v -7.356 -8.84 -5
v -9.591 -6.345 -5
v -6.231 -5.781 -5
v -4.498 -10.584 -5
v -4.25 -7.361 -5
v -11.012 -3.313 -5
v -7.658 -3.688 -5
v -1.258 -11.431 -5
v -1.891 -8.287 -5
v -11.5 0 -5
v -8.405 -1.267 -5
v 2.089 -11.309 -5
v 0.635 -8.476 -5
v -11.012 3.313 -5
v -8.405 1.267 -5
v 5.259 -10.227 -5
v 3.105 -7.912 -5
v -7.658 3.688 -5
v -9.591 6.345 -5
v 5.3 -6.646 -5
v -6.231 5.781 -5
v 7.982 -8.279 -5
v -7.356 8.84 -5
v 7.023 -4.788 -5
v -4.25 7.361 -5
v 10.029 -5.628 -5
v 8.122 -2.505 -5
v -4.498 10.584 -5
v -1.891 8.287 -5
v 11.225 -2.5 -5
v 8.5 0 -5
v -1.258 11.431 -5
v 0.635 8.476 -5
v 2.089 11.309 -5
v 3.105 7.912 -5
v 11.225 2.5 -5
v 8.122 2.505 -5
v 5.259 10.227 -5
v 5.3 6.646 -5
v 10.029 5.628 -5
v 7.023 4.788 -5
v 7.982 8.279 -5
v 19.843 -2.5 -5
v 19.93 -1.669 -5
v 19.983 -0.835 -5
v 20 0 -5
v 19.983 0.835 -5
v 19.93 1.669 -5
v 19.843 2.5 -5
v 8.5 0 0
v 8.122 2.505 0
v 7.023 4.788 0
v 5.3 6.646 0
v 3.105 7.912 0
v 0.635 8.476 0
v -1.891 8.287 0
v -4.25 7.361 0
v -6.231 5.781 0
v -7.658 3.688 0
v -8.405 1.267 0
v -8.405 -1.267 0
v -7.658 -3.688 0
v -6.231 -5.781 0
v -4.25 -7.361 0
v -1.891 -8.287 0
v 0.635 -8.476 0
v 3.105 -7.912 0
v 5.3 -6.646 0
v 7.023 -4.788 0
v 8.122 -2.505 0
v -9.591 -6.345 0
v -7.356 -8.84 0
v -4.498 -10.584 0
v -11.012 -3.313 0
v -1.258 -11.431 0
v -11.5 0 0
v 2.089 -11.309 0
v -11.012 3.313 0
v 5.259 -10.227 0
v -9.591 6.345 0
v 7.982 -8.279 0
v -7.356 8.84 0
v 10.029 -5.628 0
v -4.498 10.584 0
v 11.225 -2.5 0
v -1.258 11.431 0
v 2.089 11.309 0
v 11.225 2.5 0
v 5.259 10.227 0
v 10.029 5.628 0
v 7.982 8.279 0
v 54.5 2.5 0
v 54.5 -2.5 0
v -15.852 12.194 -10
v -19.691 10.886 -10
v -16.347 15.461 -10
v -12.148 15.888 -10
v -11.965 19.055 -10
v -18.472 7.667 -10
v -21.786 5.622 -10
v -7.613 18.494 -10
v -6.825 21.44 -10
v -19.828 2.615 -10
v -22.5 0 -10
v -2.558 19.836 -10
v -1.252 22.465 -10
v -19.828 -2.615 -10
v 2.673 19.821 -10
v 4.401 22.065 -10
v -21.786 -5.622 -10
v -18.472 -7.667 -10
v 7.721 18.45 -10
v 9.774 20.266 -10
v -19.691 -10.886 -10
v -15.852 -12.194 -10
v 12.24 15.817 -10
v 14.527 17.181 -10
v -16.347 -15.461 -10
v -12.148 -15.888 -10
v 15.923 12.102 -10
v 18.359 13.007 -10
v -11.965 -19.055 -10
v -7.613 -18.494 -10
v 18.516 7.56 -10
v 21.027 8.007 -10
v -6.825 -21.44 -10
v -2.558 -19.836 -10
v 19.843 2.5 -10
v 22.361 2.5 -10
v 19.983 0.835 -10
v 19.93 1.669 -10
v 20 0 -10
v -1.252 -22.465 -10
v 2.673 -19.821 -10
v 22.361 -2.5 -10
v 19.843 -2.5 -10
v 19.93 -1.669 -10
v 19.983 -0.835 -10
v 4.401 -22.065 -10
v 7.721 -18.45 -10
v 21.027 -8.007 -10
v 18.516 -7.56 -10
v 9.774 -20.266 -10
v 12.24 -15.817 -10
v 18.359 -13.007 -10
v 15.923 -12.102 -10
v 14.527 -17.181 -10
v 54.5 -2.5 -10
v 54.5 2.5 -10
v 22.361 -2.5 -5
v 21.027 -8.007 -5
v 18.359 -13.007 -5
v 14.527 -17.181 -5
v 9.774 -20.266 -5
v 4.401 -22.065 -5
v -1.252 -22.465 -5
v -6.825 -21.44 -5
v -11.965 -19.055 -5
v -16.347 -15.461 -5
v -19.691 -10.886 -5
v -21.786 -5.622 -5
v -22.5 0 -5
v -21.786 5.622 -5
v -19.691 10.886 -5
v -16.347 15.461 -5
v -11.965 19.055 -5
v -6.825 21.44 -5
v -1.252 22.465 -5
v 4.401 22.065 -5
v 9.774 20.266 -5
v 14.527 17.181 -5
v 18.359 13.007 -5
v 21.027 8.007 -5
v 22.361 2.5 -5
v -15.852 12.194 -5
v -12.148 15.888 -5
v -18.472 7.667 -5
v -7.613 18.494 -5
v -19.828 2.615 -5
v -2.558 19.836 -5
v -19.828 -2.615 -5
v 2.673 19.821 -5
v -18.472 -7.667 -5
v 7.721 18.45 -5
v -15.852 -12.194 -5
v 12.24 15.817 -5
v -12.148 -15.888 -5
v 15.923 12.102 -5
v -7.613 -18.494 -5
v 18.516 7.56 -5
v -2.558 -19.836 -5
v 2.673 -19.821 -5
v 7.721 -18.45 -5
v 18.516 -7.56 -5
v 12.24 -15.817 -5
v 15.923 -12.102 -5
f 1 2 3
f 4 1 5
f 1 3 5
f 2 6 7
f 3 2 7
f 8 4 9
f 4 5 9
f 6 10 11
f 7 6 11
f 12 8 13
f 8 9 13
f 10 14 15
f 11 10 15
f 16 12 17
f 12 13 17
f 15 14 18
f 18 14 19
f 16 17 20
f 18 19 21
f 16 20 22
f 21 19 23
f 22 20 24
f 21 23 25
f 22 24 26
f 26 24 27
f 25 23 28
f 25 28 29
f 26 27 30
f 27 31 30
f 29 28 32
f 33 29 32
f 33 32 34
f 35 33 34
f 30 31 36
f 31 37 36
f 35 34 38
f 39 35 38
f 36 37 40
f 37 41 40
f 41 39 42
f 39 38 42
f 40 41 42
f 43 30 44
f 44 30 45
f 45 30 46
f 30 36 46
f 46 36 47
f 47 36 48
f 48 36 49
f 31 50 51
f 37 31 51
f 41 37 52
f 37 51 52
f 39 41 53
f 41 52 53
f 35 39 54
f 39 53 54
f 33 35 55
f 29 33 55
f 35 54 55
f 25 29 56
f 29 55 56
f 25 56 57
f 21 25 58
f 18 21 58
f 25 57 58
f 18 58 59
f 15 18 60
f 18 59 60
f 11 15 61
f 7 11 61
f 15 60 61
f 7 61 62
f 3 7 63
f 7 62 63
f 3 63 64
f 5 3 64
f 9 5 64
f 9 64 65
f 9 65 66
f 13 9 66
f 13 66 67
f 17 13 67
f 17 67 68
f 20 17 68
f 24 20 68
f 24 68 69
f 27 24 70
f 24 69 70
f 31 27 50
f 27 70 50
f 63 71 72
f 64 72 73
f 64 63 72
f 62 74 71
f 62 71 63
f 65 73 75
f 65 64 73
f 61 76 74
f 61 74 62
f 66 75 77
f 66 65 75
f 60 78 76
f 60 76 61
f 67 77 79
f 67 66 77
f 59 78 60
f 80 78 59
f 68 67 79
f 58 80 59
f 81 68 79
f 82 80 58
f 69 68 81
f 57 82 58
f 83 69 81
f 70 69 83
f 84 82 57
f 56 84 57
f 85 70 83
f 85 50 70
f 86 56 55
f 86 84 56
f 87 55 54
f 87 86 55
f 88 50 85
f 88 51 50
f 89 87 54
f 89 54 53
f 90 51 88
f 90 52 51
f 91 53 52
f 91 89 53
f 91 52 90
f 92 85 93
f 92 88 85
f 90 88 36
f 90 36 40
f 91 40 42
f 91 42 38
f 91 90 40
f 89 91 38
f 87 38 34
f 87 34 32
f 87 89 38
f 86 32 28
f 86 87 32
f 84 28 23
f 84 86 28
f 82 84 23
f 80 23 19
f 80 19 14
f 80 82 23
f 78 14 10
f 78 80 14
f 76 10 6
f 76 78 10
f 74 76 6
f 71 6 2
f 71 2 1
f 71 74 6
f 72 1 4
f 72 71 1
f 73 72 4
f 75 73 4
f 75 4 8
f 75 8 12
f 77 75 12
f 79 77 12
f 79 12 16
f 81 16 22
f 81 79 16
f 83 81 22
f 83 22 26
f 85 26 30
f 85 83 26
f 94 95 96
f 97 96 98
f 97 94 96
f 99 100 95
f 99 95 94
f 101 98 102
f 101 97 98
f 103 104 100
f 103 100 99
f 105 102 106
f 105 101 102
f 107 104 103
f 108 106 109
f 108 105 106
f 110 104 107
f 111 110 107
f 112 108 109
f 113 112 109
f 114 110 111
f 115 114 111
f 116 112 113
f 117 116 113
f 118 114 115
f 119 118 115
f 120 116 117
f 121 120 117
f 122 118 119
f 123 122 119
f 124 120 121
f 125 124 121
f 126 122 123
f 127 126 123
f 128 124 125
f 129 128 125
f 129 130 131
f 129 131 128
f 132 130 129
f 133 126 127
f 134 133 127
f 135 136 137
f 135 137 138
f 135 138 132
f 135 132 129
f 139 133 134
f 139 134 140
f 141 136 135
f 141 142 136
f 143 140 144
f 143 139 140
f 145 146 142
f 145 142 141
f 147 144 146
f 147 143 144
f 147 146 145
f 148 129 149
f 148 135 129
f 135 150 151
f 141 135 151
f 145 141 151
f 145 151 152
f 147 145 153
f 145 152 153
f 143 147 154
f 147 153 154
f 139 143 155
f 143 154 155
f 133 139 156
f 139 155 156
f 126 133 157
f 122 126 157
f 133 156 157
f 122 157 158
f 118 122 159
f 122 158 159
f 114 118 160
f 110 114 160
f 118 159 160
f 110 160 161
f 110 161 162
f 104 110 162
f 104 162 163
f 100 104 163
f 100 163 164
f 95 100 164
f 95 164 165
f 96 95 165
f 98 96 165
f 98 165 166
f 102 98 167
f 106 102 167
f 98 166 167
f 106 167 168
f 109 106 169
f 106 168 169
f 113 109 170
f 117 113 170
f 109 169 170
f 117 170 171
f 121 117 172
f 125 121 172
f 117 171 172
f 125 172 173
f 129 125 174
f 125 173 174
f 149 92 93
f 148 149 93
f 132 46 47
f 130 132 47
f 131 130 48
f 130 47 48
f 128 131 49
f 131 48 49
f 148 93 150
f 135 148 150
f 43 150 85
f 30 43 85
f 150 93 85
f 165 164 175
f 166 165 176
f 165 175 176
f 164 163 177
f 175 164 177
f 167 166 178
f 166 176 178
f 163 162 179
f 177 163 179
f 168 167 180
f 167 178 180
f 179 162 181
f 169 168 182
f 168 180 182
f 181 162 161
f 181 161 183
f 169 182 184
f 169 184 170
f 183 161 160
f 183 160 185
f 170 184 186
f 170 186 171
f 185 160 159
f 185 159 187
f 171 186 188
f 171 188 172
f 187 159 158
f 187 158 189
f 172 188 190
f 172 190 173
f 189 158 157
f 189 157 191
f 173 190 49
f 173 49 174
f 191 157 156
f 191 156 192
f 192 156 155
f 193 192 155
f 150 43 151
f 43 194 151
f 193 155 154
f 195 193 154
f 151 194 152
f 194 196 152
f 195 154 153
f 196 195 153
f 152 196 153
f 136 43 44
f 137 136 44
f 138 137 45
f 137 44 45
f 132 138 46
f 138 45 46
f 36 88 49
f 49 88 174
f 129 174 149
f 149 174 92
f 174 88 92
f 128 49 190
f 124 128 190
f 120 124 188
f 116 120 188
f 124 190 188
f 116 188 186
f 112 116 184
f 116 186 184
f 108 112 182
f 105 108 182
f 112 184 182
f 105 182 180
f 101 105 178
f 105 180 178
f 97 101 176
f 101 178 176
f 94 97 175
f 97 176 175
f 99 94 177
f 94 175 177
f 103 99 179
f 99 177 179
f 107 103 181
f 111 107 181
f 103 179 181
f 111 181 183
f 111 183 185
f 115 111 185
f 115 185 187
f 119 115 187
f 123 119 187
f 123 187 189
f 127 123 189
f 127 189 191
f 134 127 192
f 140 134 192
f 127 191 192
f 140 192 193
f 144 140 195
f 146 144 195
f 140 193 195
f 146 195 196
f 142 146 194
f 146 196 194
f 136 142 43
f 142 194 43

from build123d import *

# Parameters (mm, degrees)
F0_R     = 8.5
F1_DEPTH = 5
F3_DEPTH = 5


with BuildPart() as f1:
    # F0 (on Top) → F1 (new body)
    with BuildSketch(Plane.XY):
        with BuildLine():
            ThreePointArc((11.224972, 2.5), (11.431036, 1.257541), (11.5, 0))
            ThreePointArc((11.5, 0), (11.431036, -1.257541), (11.224972, -2.5))
            Line((11.224972, -2.5), (54.5, -2.5))
            Line((54.5, -2.5), (54.5, 0))
            Line((54.5, 0), (54.5, 2.5))
            Line((54.5, 2.5), (11.224972, 2.5))
        make_face()
        with BuildLine():
            ThreePointArc((11.224972, -2.5), (11.431036, -1.257541), (11.5, 0))
            ThreePointArc((11.5, 0), (11.431036, 1.257541), (11.224972, 2.5))
            ThreePointArc((11.224972, 2.5), (-11.5, 0), (11.224972, -2.5))
        make_face()
        Circle(F0_R, mode=Mode.SUBTRACT)
    extrude(amount=-F1_DEPTH)

    # F2 (on face) → F3 (join)
    with BuildSketch(Plane(origin=(0, 0, -5), x_dir=(1, 0, 0), z_dir=(0, 0, -1))):
        with BuildLine():
            Line((54.5, 2.5), (22.36068, 2.5))
            ThreePointArc((22.36068, 2.5), (22.465143, 1.25194), (22.5, 0))
            ThreePointArc((22.5, 0), (22.465143, -1.25194), (22.36068, -2.5))
            Line((22.36068, -2.5), (54.5, -2.5))
            Line((54.5, -2.5), (54.5, 2.5))
        make_face()
        with BuildLine():
            ThreePointArc((19.843135, 2.5), (19.960745, 1.252458), (20, 0))
            ThreePointArc((20, 0), (19.960745, -1.252458), (19.843135, -2.5))
            Line((19.843135, -2.5), (22.36068, -2.5))
            ThreePointArc((22.36068, -2.5), (22.465143, -1.25194), (22.5, 0))
            ThreePointArc((22.5, 0), (22.465143, 1.25194), (22.36068, 2.5))
            Line((22.36068, 2.5), (19.843135, 2.5))
        make_face()
        with BuildLine():
            ThreePointArc((19.843135, -2.5), (-20, 0), (19.843135, 2.5))
            Line((19.843135, 2.5), (22.36068, 2.5))
            ThreePointArc((22.36068, 2.5), (-22.5, 0), (22.36068, -2.5))
            Line((22.36068, -2.5), (19.843135, -2.5))
        make_face()
    extrude(amount=F3_DEPTH)


solid = f1.part
